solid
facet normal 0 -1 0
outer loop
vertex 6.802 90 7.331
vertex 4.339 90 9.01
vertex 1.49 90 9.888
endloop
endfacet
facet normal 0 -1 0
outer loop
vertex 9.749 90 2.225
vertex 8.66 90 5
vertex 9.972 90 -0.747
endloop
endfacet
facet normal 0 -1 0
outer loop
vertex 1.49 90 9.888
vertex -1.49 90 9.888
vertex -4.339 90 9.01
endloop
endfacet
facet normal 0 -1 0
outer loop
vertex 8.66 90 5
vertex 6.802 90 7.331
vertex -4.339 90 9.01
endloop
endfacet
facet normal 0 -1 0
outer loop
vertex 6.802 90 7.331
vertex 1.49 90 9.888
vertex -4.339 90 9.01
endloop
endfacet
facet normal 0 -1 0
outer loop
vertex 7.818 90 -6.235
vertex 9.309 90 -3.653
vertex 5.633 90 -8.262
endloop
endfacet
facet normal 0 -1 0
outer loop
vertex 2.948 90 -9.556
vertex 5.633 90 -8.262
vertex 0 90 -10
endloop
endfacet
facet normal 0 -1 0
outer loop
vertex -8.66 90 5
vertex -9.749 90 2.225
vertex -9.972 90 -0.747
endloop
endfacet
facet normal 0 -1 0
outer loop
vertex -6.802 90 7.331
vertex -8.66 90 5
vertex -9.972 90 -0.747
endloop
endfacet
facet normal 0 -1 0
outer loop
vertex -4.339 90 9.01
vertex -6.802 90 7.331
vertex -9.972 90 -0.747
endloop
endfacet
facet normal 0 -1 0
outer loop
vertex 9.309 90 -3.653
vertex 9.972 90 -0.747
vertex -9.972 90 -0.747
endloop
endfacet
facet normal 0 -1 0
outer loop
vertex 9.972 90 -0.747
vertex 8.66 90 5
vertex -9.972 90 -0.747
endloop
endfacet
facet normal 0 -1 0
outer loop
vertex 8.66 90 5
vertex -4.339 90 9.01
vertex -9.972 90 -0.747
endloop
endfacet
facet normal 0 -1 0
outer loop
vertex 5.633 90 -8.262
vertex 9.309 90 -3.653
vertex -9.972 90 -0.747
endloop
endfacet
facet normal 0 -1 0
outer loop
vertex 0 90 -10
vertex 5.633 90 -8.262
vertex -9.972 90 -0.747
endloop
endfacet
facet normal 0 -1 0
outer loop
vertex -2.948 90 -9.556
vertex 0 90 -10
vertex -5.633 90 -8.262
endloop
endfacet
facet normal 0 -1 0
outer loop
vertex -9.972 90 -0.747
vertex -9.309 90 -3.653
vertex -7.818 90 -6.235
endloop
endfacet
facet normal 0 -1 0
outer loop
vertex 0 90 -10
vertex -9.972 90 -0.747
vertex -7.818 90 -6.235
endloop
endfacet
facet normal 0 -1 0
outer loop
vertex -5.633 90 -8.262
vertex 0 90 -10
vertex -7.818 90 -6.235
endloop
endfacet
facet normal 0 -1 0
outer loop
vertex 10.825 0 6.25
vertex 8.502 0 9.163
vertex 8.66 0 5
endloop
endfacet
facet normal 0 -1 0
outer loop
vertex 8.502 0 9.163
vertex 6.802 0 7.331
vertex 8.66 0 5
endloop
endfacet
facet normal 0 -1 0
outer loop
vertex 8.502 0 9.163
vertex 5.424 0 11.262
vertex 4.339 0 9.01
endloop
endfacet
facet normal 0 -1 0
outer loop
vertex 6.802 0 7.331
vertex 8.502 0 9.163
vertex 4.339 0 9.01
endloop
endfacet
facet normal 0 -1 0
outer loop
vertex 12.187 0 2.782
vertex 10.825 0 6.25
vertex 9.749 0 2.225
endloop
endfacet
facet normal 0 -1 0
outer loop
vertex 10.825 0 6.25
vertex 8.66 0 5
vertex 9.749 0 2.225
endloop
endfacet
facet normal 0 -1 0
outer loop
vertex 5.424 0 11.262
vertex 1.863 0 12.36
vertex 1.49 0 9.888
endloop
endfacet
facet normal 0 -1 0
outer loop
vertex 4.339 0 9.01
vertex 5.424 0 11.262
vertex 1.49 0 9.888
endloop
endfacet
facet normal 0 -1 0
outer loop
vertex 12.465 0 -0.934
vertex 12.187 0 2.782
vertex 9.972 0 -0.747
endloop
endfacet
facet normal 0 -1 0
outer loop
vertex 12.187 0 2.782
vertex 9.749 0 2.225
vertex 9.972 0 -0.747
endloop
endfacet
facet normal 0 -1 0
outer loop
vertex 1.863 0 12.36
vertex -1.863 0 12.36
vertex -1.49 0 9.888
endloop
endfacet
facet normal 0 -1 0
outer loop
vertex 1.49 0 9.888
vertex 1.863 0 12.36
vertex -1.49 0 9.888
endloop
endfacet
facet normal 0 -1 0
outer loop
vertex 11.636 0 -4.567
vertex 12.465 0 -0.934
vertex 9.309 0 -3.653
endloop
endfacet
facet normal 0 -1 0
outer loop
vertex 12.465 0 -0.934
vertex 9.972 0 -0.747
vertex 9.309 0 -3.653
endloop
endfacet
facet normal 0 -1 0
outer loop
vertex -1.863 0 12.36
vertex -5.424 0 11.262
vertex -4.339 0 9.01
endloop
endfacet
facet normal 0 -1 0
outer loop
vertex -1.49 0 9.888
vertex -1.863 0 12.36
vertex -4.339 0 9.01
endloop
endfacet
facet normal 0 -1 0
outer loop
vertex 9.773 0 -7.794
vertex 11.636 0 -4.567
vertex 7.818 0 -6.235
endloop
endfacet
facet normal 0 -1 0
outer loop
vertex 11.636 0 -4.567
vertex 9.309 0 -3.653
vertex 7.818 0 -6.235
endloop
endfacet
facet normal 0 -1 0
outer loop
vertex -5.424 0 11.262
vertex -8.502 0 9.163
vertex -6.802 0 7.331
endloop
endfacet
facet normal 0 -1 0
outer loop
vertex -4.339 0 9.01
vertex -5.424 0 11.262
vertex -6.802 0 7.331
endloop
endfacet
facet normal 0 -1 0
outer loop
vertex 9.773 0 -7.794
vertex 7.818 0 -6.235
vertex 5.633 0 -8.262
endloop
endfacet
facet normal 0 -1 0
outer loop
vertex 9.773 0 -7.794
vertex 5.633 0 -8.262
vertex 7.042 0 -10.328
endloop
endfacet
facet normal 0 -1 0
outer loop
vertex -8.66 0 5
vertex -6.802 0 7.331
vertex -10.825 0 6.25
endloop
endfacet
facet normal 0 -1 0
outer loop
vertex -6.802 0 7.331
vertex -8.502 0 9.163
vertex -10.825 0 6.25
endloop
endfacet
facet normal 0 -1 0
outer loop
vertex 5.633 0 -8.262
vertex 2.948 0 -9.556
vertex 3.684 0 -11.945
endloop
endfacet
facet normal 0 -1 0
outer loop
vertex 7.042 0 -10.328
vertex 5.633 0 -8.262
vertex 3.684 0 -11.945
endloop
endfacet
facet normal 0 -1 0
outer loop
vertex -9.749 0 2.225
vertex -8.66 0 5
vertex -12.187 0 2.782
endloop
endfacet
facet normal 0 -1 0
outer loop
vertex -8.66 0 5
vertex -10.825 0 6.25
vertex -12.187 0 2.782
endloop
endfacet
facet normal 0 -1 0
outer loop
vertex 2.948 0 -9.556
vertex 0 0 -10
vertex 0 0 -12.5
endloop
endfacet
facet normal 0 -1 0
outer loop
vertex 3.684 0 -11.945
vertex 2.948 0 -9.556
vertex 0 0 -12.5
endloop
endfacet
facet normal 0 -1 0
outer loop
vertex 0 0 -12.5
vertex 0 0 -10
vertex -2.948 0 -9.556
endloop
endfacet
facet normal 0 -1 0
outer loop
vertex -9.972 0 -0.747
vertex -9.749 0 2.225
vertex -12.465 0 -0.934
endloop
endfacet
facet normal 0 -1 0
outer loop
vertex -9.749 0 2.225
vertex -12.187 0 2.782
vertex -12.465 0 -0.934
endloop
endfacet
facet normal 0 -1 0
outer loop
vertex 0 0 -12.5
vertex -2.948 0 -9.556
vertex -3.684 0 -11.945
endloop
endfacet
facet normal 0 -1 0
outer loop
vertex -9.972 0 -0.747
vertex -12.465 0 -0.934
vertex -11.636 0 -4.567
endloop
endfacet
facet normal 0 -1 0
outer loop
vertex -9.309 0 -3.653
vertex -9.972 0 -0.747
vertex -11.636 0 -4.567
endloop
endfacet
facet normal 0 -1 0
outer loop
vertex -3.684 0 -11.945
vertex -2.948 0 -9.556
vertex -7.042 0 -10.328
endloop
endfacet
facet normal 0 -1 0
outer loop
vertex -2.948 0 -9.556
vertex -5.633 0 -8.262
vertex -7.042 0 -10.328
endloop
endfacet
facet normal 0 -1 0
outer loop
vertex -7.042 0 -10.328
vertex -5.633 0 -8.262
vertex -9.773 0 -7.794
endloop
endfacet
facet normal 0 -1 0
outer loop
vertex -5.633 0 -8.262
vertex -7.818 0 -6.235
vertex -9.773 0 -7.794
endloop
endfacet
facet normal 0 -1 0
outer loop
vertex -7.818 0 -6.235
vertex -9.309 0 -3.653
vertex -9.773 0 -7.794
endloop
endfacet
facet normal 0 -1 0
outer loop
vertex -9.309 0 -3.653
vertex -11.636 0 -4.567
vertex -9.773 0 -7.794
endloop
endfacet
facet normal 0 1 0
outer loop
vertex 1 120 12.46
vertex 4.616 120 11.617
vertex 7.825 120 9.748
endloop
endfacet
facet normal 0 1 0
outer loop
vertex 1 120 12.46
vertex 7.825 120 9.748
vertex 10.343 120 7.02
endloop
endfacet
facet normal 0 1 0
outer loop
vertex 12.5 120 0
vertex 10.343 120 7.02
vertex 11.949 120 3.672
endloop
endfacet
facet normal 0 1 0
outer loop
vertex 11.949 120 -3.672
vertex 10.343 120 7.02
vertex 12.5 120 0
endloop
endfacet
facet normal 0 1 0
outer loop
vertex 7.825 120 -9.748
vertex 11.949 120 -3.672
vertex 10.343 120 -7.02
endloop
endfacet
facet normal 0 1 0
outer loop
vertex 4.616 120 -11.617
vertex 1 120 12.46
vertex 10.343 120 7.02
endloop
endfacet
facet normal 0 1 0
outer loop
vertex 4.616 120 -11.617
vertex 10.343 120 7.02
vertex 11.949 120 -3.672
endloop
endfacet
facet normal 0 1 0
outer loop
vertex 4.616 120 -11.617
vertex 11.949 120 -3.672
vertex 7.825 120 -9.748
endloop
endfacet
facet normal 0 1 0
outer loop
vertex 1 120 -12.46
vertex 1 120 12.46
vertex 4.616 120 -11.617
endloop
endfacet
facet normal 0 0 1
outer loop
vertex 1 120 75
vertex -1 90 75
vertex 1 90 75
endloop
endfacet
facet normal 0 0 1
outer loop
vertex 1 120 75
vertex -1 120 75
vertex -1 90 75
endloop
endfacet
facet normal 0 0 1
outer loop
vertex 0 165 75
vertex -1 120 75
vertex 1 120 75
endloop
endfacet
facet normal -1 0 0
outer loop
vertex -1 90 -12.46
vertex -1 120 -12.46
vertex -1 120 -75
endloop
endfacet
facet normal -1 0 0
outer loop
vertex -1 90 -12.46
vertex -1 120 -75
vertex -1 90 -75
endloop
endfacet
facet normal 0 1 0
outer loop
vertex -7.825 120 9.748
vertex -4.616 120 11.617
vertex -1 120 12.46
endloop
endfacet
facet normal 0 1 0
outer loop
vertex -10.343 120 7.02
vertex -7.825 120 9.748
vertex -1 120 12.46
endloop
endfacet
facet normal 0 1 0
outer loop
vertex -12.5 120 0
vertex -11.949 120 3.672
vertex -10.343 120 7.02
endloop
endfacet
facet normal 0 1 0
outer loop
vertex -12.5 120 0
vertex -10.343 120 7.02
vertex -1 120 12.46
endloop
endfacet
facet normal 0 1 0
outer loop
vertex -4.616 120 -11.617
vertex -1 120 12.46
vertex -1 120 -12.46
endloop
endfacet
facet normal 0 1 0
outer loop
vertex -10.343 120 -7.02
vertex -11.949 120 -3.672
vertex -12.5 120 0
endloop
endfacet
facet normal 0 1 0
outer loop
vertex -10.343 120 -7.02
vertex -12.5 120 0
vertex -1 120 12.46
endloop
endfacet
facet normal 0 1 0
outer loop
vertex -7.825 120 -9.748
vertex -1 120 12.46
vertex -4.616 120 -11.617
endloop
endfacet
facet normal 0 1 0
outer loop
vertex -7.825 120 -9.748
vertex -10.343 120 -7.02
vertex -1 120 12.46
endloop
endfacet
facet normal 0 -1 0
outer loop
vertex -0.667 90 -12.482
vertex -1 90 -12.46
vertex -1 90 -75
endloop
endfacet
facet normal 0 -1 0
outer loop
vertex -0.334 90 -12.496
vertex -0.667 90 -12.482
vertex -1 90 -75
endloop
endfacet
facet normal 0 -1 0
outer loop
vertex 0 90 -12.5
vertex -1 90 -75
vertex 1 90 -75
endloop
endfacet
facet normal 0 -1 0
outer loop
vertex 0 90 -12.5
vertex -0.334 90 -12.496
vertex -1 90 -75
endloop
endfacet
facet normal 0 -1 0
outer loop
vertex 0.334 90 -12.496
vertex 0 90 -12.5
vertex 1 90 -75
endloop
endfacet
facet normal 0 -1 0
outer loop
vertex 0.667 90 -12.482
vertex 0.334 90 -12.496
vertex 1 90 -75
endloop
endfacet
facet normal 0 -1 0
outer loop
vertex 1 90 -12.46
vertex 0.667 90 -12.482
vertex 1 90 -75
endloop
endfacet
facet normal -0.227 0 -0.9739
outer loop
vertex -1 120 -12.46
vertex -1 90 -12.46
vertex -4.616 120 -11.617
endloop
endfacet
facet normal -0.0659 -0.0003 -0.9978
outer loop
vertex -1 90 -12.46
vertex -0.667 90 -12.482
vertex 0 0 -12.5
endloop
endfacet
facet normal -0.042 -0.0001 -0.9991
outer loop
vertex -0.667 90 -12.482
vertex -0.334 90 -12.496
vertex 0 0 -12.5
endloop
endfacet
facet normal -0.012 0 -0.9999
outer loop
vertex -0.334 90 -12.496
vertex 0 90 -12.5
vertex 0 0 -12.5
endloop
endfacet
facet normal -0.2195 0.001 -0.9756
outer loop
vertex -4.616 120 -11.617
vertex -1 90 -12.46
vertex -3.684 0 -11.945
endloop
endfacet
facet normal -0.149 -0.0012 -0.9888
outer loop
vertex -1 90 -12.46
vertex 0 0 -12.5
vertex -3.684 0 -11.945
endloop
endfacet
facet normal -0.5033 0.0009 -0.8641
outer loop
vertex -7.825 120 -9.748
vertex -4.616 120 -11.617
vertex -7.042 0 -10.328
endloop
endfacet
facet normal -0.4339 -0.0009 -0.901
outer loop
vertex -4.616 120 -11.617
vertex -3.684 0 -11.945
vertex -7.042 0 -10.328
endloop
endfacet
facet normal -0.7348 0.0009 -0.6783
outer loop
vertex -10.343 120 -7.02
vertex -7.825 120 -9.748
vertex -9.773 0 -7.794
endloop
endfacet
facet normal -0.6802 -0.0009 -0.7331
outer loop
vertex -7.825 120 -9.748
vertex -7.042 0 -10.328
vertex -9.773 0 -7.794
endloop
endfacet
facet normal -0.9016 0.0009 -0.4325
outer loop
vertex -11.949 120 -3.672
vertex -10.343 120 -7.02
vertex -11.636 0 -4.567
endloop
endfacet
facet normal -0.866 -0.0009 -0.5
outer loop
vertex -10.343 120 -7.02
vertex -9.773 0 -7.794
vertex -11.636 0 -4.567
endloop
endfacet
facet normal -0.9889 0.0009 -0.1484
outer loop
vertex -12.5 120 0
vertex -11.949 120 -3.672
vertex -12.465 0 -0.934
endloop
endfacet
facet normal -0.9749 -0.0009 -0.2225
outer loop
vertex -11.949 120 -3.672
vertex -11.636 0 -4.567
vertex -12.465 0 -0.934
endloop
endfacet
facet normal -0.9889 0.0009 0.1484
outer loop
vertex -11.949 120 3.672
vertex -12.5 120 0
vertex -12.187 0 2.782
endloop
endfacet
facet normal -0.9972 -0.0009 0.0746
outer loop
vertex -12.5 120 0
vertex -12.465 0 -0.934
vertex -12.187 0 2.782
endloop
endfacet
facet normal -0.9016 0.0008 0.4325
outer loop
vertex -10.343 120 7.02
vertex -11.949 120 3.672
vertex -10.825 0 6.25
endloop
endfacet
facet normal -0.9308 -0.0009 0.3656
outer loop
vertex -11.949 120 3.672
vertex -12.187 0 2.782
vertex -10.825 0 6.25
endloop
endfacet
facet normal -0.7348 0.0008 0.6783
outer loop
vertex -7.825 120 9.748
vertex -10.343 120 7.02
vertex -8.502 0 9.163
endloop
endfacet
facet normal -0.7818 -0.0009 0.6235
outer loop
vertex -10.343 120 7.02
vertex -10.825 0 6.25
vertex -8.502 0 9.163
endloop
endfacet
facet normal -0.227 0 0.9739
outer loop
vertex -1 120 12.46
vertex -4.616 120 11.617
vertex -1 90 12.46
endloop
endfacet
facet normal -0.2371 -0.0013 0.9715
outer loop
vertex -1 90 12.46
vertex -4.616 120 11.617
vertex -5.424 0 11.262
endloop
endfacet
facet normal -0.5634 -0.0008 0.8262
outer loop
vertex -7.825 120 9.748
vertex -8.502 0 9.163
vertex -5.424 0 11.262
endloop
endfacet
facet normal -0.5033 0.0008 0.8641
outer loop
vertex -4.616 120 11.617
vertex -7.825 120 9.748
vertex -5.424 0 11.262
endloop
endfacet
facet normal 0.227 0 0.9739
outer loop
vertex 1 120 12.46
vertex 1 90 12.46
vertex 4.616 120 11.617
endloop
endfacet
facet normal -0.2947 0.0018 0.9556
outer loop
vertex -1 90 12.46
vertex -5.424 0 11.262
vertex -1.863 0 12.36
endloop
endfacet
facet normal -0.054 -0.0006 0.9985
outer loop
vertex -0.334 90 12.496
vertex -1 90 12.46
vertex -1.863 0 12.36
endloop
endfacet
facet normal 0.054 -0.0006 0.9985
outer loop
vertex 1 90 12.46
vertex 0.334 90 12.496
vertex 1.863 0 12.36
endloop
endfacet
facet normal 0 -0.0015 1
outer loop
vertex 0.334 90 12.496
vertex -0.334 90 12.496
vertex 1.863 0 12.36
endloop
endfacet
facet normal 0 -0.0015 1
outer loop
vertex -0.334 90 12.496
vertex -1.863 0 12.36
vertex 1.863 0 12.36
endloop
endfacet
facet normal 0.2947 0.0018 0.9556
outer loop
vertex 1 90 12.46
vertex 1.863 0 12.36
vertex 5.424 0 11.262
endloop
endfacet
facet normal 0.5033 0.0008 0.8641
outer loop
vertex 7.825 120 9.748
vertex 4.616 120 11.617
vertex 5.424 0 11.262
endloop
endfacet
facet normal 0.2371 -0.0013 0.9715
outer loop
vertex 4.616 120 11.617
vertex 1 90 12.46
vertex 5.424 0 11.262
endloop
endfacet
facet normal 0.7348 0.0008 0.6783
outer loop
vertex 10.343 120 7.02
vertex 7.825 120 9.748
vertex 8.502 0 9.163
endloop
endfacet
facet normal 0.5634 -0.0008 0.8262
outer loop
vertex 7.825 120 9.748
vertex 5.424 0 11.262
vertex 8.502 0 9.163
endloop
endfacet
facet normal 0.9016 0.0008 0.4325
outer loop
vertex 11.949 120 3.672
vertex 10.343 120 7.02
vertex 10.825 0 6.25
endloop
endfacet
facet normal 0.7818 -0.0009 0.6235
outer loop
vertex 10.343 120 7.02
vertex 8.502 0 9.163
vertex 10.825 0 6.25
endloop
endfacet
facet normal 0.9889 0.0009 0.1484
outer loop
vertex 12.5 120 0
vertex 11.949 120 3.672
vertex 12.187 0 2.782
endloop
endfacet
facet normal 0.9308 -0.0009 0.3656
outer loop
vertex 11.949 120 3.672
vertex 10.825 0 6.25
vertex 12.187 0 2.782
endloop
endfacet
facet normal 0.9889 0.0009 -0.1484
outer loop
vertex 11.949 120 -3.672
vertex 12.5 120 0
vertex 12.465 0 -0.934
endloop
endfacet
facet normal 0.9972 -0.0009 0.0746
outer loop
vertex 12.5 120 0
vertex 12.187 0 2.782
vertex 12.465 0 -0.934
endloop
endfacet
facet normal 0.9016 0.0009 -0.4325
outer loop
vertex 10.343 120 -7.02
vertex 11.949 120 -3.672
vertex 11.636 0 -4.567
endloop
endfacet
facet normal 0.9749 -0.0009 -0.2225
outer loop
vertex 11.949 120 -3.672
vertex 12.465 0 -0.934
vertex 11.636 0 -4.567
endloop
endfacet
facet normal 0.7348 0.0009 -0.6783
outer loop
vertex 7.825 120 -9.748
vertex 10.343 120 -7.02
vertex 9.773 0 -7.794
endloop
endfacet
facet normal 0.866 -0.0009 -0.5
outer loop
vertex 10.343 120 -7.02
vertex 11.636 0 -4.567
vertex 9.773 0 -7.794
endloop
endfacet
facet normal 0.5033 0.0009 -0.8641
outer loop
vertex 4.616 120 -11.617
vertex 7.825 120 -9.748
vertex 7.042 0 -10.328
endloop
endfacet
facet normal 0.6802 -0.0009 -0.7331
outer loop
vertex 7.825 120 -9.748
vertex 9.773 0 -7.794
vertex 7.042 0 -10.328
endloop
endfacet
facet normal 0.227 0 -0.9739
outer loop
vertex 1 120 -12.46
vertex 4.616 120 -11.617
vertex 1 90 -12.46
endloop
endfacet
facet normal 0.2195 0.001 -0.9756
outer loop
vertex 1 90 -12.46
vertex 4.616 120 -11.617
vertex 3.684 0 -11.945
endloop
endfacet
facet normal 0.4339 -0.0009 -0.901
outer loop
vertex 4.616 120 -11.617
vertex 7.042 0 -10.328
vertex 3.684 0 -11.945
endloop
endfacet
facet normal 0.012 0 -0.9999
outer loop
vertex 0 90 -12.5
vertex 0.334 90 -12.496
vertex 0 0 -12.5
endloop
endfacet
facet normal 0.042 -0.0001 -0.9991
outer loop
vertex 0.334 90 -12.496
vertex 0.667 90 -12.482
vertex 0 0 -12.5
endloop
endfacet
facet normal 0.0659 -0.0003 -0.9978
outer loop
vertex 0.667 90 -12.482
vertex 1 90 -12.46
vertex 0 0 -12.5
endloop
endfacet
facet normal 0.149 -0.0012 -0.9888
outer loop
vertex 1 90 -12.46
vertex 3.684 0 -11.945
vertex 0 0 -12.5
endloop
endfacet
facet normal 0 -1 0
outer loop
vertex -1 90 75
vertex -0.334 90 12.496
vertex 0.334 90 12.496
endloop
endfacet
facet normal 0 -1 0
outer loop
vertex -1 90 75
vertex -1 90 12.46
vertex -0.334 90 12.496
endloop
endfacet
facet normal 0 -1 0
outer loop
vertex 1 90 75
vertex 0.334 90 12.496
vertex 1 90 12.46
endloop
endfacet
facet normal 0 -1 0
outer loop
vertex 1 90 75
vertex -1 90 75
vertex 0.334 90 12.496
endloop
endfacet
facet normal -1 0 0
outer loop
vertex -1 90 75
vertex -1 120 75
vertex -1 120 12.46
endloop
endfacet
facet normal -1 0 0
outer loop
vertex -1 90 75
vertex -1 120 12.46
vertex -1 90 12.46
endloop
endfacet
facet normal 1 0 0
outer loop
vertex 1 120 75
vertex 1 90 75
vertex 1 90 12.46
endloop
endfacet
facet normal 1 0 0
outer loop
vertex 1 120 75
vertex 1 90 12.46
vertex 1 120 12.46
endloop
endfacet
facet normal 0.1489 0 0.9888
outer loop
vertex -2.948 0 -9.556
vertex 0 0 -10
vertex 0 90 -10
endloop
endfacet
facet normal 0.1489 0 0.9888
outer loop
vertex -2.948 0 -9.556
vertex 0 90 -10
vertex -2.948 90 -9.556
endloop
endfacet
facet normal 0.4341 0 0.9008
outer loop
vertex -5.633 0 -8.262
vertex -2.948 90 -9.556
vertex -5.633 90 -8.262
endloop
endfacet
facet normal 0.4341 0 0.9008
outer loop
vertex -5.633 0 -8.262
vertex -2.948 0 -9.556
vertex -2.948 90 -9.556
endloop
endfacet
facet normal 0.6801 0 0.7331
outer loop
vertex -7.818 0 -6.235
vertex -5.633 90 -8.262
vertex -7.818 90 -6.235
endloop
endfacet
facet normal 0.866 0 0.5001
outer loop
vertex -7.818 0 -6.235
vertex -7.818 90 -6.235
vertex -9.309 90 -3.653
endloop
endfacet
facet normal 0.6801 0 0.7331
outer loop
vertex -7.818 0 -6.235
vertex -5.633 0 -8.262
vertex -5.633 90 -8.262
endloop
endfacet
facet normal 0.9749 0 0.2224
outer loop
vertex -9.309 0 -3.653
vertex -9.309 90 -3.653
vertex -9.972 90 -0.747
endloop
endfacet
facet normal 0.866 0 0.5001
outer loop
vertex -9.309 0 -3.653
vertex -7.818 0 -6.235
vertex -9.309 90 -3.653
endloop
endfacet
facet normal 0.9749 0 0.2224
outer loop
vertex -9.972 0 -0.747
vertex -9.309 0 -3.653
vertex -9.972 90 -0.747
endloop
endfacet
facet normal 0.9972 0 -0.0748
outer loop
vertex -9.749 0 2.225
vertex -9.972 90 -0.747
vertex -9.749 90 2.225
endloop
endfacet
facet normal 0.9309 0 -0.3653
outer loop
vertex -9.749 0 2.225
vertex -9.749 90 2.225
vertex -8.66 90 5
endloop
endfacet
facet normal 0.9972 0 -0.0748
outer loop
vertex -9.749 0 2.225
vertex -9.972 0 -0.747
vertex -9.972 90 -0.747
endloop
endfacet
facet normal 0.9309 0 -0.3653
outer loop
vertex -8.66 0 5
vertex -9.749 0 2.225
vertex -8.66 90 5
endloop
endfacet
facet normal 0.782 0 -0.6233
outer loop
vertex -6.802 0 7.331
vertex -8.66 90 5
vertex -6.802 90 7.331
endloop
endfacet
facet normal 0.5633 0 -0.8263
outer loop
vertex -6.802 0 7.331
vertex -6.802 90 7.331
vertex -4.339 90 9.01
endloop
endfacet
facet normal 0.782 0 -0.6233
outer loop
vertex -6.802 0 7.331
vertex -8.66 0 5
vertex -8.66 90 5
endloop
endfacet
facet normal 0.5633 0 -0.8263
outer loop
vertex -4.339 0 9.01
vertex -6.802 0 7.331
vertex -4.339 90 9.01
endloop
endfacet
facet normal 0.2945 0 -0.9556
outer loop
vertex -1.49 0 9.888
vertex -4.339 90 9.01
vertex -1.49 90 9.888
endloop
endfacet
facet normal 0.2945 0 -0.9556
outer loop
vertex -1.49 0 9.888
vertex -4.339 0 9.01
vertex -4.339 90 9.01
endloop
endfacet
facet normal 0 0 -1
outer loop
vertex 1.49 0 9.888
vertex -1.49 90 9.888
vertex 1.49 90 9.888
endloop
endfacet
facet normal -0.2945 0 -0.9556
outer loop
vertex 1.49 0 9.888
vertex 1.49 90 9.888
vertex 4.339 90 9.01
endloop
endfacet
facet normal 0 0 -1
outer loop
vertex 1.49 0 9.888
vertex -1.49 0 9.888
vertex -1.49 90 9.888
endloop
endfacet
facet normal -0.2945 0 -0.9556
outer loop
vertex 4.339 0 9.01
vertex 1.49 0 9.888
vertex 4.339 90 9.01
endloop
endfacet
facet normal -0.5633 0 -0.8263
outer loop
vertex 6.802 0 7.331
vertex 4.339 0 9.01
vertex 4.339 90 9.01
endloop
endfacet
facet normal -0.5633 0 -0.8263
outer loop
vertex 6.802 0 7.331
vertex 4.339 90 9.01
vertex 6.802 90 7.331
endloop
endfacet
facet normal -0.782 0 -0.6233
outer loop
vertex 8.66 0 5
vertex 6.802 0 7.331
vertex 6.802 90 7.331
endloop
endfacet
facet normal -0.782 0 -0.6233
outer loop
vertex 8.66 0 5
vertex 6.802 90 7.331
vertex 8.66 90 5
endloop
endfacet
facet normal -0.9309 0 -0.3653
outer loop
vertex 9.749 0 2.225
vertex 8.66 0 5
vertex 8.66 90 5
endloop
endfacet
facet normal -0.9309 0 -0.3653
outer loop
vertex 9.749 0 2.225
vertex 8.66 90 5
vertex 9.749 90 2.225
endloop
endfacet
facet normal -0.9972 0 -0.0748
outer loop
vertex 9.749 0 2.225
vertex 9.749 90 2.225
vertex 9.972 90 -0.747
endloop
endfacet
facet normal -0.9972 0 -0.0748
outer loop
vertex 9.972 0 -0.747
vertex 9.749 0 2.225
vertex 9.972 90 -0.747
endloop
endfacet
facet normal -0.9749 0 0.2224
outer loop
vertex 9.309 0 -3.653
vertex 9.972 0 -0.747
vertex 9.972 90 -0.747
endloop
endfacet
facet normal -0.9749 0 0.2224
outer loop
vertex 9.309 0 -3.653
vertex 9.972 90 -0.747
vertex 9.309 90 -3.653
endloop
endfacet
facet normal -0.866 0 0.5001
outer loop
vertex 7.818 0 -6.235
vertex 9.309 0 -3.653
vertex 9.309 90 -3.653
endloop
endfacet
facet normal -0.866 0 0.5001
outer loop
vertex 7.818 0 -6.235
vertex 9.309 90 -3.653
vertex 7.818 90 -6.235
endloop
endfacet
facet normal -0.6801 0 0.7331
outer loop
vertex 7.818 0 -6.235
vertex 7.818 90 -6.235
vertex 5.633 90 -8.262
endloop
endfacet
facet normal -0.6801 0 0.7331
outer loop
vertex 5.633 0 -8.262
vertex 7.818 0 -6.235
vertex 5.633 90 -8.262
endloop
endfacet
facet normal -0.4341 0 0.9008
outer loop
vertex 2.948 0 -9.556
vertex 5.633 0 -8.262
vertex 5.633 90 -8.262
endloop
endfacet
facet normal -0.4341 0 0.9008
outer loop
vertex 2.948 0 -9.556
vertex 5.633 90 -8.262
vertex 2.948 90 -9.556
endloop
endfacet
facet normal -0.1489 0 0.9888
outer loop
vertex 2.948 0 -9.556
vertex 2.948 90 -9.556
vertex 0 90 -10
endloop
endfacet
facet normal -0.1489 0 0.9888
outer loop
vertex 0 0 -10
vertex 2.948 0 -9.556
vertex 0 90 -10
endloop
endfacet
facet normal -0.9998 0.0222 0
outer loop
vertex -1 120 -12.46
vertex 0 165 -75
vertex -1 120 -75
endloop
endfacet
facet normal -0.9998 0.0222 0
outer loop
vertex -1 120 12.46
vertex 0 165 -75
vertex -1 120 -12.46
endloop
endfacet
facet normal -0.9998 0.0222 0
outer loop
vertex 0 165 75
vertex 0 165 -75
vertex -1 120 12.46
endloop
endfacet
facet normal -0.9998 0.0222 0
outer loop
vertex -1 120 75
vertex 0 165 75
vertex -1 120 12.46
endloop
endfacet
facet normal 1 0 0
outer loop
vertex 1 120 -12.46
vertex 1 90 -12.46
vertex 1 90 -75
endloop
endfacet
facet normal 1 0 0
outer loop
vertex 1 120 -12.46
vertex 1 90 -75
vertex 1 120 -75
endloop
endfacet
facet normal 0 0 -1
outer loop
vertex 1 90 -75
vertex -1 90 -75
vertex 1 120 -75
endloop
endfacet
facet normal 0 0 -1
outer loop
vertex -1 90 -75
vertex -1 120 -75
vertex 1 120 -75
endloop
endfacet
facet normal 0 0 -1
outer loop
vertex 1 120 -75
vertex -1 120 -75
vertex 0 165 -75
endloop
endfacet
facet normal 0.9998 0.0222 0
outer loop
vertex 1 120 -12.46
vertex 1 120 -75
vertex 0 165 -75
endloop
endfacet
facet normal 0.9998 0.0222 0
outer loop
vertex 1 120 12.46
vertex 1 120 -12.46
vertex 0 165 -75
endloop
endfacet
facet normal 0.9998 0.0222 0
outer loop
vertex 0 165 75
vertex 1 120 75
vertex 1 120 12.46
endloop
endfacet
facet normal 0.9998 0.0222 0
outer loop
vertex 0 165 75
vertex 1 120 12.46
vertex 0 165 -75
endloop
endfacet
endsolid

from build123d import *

# Parameters (mm, degrees)
SKETCH2_R           = 12.5
SKETCH2_R_2         = 10
BOSS_EXTRUDE3_DEPTH = 90
SKETCH3_R           = 12.5
BOSS_EXTRUDE4_DEPTH = 30
BOSS_EXTRUDE5_DEPTH = 75


with BuildPart() as part:
    # Sketch2 → Boss-Extrude3 (new body)
    with BuildSketch(Plane(origin=(0, 0, 0), x_dir=(1, 0, 0), z_dir=(0, 1, 0))):
        with Locations(Location((0, 0, 0), (0, 0, 90))):
            Circle(SKETCH2_R)
        with Locations(Location((0, 0, 0), (0, 0, 90))):
            Circle(SKETCH2_R_2, mode=Mode.SUBTRACT)
    extrude(amount=BOSS_EXTRUDE3_DEPTH)

    # Sketch3 → Boss-Extrude4 (add)
    with BuildSketch(Plane(origin=(0, 90, 0), x_dir=(1, 0, 0), z_dir=(0, 1, 0))):
        with Locations(Location((0, 0, 0), (0, 0, 90))):
            Circle(SKETCH3_R)
    extrude(amount=BOSS_EXTRUDE4_DEPTH)

    # Sketch5 → Boss-Extrude5 (add, symmetric)
    with BuildSketch(Plane.XY):
        Polygon((-1, 90), (1, 90), (1, 120), (0, 165), (-1, 120), align=None)
    extrude(amount=BOSS_EXTRUDE5_DEPTH, both=True)


solid = part.part
